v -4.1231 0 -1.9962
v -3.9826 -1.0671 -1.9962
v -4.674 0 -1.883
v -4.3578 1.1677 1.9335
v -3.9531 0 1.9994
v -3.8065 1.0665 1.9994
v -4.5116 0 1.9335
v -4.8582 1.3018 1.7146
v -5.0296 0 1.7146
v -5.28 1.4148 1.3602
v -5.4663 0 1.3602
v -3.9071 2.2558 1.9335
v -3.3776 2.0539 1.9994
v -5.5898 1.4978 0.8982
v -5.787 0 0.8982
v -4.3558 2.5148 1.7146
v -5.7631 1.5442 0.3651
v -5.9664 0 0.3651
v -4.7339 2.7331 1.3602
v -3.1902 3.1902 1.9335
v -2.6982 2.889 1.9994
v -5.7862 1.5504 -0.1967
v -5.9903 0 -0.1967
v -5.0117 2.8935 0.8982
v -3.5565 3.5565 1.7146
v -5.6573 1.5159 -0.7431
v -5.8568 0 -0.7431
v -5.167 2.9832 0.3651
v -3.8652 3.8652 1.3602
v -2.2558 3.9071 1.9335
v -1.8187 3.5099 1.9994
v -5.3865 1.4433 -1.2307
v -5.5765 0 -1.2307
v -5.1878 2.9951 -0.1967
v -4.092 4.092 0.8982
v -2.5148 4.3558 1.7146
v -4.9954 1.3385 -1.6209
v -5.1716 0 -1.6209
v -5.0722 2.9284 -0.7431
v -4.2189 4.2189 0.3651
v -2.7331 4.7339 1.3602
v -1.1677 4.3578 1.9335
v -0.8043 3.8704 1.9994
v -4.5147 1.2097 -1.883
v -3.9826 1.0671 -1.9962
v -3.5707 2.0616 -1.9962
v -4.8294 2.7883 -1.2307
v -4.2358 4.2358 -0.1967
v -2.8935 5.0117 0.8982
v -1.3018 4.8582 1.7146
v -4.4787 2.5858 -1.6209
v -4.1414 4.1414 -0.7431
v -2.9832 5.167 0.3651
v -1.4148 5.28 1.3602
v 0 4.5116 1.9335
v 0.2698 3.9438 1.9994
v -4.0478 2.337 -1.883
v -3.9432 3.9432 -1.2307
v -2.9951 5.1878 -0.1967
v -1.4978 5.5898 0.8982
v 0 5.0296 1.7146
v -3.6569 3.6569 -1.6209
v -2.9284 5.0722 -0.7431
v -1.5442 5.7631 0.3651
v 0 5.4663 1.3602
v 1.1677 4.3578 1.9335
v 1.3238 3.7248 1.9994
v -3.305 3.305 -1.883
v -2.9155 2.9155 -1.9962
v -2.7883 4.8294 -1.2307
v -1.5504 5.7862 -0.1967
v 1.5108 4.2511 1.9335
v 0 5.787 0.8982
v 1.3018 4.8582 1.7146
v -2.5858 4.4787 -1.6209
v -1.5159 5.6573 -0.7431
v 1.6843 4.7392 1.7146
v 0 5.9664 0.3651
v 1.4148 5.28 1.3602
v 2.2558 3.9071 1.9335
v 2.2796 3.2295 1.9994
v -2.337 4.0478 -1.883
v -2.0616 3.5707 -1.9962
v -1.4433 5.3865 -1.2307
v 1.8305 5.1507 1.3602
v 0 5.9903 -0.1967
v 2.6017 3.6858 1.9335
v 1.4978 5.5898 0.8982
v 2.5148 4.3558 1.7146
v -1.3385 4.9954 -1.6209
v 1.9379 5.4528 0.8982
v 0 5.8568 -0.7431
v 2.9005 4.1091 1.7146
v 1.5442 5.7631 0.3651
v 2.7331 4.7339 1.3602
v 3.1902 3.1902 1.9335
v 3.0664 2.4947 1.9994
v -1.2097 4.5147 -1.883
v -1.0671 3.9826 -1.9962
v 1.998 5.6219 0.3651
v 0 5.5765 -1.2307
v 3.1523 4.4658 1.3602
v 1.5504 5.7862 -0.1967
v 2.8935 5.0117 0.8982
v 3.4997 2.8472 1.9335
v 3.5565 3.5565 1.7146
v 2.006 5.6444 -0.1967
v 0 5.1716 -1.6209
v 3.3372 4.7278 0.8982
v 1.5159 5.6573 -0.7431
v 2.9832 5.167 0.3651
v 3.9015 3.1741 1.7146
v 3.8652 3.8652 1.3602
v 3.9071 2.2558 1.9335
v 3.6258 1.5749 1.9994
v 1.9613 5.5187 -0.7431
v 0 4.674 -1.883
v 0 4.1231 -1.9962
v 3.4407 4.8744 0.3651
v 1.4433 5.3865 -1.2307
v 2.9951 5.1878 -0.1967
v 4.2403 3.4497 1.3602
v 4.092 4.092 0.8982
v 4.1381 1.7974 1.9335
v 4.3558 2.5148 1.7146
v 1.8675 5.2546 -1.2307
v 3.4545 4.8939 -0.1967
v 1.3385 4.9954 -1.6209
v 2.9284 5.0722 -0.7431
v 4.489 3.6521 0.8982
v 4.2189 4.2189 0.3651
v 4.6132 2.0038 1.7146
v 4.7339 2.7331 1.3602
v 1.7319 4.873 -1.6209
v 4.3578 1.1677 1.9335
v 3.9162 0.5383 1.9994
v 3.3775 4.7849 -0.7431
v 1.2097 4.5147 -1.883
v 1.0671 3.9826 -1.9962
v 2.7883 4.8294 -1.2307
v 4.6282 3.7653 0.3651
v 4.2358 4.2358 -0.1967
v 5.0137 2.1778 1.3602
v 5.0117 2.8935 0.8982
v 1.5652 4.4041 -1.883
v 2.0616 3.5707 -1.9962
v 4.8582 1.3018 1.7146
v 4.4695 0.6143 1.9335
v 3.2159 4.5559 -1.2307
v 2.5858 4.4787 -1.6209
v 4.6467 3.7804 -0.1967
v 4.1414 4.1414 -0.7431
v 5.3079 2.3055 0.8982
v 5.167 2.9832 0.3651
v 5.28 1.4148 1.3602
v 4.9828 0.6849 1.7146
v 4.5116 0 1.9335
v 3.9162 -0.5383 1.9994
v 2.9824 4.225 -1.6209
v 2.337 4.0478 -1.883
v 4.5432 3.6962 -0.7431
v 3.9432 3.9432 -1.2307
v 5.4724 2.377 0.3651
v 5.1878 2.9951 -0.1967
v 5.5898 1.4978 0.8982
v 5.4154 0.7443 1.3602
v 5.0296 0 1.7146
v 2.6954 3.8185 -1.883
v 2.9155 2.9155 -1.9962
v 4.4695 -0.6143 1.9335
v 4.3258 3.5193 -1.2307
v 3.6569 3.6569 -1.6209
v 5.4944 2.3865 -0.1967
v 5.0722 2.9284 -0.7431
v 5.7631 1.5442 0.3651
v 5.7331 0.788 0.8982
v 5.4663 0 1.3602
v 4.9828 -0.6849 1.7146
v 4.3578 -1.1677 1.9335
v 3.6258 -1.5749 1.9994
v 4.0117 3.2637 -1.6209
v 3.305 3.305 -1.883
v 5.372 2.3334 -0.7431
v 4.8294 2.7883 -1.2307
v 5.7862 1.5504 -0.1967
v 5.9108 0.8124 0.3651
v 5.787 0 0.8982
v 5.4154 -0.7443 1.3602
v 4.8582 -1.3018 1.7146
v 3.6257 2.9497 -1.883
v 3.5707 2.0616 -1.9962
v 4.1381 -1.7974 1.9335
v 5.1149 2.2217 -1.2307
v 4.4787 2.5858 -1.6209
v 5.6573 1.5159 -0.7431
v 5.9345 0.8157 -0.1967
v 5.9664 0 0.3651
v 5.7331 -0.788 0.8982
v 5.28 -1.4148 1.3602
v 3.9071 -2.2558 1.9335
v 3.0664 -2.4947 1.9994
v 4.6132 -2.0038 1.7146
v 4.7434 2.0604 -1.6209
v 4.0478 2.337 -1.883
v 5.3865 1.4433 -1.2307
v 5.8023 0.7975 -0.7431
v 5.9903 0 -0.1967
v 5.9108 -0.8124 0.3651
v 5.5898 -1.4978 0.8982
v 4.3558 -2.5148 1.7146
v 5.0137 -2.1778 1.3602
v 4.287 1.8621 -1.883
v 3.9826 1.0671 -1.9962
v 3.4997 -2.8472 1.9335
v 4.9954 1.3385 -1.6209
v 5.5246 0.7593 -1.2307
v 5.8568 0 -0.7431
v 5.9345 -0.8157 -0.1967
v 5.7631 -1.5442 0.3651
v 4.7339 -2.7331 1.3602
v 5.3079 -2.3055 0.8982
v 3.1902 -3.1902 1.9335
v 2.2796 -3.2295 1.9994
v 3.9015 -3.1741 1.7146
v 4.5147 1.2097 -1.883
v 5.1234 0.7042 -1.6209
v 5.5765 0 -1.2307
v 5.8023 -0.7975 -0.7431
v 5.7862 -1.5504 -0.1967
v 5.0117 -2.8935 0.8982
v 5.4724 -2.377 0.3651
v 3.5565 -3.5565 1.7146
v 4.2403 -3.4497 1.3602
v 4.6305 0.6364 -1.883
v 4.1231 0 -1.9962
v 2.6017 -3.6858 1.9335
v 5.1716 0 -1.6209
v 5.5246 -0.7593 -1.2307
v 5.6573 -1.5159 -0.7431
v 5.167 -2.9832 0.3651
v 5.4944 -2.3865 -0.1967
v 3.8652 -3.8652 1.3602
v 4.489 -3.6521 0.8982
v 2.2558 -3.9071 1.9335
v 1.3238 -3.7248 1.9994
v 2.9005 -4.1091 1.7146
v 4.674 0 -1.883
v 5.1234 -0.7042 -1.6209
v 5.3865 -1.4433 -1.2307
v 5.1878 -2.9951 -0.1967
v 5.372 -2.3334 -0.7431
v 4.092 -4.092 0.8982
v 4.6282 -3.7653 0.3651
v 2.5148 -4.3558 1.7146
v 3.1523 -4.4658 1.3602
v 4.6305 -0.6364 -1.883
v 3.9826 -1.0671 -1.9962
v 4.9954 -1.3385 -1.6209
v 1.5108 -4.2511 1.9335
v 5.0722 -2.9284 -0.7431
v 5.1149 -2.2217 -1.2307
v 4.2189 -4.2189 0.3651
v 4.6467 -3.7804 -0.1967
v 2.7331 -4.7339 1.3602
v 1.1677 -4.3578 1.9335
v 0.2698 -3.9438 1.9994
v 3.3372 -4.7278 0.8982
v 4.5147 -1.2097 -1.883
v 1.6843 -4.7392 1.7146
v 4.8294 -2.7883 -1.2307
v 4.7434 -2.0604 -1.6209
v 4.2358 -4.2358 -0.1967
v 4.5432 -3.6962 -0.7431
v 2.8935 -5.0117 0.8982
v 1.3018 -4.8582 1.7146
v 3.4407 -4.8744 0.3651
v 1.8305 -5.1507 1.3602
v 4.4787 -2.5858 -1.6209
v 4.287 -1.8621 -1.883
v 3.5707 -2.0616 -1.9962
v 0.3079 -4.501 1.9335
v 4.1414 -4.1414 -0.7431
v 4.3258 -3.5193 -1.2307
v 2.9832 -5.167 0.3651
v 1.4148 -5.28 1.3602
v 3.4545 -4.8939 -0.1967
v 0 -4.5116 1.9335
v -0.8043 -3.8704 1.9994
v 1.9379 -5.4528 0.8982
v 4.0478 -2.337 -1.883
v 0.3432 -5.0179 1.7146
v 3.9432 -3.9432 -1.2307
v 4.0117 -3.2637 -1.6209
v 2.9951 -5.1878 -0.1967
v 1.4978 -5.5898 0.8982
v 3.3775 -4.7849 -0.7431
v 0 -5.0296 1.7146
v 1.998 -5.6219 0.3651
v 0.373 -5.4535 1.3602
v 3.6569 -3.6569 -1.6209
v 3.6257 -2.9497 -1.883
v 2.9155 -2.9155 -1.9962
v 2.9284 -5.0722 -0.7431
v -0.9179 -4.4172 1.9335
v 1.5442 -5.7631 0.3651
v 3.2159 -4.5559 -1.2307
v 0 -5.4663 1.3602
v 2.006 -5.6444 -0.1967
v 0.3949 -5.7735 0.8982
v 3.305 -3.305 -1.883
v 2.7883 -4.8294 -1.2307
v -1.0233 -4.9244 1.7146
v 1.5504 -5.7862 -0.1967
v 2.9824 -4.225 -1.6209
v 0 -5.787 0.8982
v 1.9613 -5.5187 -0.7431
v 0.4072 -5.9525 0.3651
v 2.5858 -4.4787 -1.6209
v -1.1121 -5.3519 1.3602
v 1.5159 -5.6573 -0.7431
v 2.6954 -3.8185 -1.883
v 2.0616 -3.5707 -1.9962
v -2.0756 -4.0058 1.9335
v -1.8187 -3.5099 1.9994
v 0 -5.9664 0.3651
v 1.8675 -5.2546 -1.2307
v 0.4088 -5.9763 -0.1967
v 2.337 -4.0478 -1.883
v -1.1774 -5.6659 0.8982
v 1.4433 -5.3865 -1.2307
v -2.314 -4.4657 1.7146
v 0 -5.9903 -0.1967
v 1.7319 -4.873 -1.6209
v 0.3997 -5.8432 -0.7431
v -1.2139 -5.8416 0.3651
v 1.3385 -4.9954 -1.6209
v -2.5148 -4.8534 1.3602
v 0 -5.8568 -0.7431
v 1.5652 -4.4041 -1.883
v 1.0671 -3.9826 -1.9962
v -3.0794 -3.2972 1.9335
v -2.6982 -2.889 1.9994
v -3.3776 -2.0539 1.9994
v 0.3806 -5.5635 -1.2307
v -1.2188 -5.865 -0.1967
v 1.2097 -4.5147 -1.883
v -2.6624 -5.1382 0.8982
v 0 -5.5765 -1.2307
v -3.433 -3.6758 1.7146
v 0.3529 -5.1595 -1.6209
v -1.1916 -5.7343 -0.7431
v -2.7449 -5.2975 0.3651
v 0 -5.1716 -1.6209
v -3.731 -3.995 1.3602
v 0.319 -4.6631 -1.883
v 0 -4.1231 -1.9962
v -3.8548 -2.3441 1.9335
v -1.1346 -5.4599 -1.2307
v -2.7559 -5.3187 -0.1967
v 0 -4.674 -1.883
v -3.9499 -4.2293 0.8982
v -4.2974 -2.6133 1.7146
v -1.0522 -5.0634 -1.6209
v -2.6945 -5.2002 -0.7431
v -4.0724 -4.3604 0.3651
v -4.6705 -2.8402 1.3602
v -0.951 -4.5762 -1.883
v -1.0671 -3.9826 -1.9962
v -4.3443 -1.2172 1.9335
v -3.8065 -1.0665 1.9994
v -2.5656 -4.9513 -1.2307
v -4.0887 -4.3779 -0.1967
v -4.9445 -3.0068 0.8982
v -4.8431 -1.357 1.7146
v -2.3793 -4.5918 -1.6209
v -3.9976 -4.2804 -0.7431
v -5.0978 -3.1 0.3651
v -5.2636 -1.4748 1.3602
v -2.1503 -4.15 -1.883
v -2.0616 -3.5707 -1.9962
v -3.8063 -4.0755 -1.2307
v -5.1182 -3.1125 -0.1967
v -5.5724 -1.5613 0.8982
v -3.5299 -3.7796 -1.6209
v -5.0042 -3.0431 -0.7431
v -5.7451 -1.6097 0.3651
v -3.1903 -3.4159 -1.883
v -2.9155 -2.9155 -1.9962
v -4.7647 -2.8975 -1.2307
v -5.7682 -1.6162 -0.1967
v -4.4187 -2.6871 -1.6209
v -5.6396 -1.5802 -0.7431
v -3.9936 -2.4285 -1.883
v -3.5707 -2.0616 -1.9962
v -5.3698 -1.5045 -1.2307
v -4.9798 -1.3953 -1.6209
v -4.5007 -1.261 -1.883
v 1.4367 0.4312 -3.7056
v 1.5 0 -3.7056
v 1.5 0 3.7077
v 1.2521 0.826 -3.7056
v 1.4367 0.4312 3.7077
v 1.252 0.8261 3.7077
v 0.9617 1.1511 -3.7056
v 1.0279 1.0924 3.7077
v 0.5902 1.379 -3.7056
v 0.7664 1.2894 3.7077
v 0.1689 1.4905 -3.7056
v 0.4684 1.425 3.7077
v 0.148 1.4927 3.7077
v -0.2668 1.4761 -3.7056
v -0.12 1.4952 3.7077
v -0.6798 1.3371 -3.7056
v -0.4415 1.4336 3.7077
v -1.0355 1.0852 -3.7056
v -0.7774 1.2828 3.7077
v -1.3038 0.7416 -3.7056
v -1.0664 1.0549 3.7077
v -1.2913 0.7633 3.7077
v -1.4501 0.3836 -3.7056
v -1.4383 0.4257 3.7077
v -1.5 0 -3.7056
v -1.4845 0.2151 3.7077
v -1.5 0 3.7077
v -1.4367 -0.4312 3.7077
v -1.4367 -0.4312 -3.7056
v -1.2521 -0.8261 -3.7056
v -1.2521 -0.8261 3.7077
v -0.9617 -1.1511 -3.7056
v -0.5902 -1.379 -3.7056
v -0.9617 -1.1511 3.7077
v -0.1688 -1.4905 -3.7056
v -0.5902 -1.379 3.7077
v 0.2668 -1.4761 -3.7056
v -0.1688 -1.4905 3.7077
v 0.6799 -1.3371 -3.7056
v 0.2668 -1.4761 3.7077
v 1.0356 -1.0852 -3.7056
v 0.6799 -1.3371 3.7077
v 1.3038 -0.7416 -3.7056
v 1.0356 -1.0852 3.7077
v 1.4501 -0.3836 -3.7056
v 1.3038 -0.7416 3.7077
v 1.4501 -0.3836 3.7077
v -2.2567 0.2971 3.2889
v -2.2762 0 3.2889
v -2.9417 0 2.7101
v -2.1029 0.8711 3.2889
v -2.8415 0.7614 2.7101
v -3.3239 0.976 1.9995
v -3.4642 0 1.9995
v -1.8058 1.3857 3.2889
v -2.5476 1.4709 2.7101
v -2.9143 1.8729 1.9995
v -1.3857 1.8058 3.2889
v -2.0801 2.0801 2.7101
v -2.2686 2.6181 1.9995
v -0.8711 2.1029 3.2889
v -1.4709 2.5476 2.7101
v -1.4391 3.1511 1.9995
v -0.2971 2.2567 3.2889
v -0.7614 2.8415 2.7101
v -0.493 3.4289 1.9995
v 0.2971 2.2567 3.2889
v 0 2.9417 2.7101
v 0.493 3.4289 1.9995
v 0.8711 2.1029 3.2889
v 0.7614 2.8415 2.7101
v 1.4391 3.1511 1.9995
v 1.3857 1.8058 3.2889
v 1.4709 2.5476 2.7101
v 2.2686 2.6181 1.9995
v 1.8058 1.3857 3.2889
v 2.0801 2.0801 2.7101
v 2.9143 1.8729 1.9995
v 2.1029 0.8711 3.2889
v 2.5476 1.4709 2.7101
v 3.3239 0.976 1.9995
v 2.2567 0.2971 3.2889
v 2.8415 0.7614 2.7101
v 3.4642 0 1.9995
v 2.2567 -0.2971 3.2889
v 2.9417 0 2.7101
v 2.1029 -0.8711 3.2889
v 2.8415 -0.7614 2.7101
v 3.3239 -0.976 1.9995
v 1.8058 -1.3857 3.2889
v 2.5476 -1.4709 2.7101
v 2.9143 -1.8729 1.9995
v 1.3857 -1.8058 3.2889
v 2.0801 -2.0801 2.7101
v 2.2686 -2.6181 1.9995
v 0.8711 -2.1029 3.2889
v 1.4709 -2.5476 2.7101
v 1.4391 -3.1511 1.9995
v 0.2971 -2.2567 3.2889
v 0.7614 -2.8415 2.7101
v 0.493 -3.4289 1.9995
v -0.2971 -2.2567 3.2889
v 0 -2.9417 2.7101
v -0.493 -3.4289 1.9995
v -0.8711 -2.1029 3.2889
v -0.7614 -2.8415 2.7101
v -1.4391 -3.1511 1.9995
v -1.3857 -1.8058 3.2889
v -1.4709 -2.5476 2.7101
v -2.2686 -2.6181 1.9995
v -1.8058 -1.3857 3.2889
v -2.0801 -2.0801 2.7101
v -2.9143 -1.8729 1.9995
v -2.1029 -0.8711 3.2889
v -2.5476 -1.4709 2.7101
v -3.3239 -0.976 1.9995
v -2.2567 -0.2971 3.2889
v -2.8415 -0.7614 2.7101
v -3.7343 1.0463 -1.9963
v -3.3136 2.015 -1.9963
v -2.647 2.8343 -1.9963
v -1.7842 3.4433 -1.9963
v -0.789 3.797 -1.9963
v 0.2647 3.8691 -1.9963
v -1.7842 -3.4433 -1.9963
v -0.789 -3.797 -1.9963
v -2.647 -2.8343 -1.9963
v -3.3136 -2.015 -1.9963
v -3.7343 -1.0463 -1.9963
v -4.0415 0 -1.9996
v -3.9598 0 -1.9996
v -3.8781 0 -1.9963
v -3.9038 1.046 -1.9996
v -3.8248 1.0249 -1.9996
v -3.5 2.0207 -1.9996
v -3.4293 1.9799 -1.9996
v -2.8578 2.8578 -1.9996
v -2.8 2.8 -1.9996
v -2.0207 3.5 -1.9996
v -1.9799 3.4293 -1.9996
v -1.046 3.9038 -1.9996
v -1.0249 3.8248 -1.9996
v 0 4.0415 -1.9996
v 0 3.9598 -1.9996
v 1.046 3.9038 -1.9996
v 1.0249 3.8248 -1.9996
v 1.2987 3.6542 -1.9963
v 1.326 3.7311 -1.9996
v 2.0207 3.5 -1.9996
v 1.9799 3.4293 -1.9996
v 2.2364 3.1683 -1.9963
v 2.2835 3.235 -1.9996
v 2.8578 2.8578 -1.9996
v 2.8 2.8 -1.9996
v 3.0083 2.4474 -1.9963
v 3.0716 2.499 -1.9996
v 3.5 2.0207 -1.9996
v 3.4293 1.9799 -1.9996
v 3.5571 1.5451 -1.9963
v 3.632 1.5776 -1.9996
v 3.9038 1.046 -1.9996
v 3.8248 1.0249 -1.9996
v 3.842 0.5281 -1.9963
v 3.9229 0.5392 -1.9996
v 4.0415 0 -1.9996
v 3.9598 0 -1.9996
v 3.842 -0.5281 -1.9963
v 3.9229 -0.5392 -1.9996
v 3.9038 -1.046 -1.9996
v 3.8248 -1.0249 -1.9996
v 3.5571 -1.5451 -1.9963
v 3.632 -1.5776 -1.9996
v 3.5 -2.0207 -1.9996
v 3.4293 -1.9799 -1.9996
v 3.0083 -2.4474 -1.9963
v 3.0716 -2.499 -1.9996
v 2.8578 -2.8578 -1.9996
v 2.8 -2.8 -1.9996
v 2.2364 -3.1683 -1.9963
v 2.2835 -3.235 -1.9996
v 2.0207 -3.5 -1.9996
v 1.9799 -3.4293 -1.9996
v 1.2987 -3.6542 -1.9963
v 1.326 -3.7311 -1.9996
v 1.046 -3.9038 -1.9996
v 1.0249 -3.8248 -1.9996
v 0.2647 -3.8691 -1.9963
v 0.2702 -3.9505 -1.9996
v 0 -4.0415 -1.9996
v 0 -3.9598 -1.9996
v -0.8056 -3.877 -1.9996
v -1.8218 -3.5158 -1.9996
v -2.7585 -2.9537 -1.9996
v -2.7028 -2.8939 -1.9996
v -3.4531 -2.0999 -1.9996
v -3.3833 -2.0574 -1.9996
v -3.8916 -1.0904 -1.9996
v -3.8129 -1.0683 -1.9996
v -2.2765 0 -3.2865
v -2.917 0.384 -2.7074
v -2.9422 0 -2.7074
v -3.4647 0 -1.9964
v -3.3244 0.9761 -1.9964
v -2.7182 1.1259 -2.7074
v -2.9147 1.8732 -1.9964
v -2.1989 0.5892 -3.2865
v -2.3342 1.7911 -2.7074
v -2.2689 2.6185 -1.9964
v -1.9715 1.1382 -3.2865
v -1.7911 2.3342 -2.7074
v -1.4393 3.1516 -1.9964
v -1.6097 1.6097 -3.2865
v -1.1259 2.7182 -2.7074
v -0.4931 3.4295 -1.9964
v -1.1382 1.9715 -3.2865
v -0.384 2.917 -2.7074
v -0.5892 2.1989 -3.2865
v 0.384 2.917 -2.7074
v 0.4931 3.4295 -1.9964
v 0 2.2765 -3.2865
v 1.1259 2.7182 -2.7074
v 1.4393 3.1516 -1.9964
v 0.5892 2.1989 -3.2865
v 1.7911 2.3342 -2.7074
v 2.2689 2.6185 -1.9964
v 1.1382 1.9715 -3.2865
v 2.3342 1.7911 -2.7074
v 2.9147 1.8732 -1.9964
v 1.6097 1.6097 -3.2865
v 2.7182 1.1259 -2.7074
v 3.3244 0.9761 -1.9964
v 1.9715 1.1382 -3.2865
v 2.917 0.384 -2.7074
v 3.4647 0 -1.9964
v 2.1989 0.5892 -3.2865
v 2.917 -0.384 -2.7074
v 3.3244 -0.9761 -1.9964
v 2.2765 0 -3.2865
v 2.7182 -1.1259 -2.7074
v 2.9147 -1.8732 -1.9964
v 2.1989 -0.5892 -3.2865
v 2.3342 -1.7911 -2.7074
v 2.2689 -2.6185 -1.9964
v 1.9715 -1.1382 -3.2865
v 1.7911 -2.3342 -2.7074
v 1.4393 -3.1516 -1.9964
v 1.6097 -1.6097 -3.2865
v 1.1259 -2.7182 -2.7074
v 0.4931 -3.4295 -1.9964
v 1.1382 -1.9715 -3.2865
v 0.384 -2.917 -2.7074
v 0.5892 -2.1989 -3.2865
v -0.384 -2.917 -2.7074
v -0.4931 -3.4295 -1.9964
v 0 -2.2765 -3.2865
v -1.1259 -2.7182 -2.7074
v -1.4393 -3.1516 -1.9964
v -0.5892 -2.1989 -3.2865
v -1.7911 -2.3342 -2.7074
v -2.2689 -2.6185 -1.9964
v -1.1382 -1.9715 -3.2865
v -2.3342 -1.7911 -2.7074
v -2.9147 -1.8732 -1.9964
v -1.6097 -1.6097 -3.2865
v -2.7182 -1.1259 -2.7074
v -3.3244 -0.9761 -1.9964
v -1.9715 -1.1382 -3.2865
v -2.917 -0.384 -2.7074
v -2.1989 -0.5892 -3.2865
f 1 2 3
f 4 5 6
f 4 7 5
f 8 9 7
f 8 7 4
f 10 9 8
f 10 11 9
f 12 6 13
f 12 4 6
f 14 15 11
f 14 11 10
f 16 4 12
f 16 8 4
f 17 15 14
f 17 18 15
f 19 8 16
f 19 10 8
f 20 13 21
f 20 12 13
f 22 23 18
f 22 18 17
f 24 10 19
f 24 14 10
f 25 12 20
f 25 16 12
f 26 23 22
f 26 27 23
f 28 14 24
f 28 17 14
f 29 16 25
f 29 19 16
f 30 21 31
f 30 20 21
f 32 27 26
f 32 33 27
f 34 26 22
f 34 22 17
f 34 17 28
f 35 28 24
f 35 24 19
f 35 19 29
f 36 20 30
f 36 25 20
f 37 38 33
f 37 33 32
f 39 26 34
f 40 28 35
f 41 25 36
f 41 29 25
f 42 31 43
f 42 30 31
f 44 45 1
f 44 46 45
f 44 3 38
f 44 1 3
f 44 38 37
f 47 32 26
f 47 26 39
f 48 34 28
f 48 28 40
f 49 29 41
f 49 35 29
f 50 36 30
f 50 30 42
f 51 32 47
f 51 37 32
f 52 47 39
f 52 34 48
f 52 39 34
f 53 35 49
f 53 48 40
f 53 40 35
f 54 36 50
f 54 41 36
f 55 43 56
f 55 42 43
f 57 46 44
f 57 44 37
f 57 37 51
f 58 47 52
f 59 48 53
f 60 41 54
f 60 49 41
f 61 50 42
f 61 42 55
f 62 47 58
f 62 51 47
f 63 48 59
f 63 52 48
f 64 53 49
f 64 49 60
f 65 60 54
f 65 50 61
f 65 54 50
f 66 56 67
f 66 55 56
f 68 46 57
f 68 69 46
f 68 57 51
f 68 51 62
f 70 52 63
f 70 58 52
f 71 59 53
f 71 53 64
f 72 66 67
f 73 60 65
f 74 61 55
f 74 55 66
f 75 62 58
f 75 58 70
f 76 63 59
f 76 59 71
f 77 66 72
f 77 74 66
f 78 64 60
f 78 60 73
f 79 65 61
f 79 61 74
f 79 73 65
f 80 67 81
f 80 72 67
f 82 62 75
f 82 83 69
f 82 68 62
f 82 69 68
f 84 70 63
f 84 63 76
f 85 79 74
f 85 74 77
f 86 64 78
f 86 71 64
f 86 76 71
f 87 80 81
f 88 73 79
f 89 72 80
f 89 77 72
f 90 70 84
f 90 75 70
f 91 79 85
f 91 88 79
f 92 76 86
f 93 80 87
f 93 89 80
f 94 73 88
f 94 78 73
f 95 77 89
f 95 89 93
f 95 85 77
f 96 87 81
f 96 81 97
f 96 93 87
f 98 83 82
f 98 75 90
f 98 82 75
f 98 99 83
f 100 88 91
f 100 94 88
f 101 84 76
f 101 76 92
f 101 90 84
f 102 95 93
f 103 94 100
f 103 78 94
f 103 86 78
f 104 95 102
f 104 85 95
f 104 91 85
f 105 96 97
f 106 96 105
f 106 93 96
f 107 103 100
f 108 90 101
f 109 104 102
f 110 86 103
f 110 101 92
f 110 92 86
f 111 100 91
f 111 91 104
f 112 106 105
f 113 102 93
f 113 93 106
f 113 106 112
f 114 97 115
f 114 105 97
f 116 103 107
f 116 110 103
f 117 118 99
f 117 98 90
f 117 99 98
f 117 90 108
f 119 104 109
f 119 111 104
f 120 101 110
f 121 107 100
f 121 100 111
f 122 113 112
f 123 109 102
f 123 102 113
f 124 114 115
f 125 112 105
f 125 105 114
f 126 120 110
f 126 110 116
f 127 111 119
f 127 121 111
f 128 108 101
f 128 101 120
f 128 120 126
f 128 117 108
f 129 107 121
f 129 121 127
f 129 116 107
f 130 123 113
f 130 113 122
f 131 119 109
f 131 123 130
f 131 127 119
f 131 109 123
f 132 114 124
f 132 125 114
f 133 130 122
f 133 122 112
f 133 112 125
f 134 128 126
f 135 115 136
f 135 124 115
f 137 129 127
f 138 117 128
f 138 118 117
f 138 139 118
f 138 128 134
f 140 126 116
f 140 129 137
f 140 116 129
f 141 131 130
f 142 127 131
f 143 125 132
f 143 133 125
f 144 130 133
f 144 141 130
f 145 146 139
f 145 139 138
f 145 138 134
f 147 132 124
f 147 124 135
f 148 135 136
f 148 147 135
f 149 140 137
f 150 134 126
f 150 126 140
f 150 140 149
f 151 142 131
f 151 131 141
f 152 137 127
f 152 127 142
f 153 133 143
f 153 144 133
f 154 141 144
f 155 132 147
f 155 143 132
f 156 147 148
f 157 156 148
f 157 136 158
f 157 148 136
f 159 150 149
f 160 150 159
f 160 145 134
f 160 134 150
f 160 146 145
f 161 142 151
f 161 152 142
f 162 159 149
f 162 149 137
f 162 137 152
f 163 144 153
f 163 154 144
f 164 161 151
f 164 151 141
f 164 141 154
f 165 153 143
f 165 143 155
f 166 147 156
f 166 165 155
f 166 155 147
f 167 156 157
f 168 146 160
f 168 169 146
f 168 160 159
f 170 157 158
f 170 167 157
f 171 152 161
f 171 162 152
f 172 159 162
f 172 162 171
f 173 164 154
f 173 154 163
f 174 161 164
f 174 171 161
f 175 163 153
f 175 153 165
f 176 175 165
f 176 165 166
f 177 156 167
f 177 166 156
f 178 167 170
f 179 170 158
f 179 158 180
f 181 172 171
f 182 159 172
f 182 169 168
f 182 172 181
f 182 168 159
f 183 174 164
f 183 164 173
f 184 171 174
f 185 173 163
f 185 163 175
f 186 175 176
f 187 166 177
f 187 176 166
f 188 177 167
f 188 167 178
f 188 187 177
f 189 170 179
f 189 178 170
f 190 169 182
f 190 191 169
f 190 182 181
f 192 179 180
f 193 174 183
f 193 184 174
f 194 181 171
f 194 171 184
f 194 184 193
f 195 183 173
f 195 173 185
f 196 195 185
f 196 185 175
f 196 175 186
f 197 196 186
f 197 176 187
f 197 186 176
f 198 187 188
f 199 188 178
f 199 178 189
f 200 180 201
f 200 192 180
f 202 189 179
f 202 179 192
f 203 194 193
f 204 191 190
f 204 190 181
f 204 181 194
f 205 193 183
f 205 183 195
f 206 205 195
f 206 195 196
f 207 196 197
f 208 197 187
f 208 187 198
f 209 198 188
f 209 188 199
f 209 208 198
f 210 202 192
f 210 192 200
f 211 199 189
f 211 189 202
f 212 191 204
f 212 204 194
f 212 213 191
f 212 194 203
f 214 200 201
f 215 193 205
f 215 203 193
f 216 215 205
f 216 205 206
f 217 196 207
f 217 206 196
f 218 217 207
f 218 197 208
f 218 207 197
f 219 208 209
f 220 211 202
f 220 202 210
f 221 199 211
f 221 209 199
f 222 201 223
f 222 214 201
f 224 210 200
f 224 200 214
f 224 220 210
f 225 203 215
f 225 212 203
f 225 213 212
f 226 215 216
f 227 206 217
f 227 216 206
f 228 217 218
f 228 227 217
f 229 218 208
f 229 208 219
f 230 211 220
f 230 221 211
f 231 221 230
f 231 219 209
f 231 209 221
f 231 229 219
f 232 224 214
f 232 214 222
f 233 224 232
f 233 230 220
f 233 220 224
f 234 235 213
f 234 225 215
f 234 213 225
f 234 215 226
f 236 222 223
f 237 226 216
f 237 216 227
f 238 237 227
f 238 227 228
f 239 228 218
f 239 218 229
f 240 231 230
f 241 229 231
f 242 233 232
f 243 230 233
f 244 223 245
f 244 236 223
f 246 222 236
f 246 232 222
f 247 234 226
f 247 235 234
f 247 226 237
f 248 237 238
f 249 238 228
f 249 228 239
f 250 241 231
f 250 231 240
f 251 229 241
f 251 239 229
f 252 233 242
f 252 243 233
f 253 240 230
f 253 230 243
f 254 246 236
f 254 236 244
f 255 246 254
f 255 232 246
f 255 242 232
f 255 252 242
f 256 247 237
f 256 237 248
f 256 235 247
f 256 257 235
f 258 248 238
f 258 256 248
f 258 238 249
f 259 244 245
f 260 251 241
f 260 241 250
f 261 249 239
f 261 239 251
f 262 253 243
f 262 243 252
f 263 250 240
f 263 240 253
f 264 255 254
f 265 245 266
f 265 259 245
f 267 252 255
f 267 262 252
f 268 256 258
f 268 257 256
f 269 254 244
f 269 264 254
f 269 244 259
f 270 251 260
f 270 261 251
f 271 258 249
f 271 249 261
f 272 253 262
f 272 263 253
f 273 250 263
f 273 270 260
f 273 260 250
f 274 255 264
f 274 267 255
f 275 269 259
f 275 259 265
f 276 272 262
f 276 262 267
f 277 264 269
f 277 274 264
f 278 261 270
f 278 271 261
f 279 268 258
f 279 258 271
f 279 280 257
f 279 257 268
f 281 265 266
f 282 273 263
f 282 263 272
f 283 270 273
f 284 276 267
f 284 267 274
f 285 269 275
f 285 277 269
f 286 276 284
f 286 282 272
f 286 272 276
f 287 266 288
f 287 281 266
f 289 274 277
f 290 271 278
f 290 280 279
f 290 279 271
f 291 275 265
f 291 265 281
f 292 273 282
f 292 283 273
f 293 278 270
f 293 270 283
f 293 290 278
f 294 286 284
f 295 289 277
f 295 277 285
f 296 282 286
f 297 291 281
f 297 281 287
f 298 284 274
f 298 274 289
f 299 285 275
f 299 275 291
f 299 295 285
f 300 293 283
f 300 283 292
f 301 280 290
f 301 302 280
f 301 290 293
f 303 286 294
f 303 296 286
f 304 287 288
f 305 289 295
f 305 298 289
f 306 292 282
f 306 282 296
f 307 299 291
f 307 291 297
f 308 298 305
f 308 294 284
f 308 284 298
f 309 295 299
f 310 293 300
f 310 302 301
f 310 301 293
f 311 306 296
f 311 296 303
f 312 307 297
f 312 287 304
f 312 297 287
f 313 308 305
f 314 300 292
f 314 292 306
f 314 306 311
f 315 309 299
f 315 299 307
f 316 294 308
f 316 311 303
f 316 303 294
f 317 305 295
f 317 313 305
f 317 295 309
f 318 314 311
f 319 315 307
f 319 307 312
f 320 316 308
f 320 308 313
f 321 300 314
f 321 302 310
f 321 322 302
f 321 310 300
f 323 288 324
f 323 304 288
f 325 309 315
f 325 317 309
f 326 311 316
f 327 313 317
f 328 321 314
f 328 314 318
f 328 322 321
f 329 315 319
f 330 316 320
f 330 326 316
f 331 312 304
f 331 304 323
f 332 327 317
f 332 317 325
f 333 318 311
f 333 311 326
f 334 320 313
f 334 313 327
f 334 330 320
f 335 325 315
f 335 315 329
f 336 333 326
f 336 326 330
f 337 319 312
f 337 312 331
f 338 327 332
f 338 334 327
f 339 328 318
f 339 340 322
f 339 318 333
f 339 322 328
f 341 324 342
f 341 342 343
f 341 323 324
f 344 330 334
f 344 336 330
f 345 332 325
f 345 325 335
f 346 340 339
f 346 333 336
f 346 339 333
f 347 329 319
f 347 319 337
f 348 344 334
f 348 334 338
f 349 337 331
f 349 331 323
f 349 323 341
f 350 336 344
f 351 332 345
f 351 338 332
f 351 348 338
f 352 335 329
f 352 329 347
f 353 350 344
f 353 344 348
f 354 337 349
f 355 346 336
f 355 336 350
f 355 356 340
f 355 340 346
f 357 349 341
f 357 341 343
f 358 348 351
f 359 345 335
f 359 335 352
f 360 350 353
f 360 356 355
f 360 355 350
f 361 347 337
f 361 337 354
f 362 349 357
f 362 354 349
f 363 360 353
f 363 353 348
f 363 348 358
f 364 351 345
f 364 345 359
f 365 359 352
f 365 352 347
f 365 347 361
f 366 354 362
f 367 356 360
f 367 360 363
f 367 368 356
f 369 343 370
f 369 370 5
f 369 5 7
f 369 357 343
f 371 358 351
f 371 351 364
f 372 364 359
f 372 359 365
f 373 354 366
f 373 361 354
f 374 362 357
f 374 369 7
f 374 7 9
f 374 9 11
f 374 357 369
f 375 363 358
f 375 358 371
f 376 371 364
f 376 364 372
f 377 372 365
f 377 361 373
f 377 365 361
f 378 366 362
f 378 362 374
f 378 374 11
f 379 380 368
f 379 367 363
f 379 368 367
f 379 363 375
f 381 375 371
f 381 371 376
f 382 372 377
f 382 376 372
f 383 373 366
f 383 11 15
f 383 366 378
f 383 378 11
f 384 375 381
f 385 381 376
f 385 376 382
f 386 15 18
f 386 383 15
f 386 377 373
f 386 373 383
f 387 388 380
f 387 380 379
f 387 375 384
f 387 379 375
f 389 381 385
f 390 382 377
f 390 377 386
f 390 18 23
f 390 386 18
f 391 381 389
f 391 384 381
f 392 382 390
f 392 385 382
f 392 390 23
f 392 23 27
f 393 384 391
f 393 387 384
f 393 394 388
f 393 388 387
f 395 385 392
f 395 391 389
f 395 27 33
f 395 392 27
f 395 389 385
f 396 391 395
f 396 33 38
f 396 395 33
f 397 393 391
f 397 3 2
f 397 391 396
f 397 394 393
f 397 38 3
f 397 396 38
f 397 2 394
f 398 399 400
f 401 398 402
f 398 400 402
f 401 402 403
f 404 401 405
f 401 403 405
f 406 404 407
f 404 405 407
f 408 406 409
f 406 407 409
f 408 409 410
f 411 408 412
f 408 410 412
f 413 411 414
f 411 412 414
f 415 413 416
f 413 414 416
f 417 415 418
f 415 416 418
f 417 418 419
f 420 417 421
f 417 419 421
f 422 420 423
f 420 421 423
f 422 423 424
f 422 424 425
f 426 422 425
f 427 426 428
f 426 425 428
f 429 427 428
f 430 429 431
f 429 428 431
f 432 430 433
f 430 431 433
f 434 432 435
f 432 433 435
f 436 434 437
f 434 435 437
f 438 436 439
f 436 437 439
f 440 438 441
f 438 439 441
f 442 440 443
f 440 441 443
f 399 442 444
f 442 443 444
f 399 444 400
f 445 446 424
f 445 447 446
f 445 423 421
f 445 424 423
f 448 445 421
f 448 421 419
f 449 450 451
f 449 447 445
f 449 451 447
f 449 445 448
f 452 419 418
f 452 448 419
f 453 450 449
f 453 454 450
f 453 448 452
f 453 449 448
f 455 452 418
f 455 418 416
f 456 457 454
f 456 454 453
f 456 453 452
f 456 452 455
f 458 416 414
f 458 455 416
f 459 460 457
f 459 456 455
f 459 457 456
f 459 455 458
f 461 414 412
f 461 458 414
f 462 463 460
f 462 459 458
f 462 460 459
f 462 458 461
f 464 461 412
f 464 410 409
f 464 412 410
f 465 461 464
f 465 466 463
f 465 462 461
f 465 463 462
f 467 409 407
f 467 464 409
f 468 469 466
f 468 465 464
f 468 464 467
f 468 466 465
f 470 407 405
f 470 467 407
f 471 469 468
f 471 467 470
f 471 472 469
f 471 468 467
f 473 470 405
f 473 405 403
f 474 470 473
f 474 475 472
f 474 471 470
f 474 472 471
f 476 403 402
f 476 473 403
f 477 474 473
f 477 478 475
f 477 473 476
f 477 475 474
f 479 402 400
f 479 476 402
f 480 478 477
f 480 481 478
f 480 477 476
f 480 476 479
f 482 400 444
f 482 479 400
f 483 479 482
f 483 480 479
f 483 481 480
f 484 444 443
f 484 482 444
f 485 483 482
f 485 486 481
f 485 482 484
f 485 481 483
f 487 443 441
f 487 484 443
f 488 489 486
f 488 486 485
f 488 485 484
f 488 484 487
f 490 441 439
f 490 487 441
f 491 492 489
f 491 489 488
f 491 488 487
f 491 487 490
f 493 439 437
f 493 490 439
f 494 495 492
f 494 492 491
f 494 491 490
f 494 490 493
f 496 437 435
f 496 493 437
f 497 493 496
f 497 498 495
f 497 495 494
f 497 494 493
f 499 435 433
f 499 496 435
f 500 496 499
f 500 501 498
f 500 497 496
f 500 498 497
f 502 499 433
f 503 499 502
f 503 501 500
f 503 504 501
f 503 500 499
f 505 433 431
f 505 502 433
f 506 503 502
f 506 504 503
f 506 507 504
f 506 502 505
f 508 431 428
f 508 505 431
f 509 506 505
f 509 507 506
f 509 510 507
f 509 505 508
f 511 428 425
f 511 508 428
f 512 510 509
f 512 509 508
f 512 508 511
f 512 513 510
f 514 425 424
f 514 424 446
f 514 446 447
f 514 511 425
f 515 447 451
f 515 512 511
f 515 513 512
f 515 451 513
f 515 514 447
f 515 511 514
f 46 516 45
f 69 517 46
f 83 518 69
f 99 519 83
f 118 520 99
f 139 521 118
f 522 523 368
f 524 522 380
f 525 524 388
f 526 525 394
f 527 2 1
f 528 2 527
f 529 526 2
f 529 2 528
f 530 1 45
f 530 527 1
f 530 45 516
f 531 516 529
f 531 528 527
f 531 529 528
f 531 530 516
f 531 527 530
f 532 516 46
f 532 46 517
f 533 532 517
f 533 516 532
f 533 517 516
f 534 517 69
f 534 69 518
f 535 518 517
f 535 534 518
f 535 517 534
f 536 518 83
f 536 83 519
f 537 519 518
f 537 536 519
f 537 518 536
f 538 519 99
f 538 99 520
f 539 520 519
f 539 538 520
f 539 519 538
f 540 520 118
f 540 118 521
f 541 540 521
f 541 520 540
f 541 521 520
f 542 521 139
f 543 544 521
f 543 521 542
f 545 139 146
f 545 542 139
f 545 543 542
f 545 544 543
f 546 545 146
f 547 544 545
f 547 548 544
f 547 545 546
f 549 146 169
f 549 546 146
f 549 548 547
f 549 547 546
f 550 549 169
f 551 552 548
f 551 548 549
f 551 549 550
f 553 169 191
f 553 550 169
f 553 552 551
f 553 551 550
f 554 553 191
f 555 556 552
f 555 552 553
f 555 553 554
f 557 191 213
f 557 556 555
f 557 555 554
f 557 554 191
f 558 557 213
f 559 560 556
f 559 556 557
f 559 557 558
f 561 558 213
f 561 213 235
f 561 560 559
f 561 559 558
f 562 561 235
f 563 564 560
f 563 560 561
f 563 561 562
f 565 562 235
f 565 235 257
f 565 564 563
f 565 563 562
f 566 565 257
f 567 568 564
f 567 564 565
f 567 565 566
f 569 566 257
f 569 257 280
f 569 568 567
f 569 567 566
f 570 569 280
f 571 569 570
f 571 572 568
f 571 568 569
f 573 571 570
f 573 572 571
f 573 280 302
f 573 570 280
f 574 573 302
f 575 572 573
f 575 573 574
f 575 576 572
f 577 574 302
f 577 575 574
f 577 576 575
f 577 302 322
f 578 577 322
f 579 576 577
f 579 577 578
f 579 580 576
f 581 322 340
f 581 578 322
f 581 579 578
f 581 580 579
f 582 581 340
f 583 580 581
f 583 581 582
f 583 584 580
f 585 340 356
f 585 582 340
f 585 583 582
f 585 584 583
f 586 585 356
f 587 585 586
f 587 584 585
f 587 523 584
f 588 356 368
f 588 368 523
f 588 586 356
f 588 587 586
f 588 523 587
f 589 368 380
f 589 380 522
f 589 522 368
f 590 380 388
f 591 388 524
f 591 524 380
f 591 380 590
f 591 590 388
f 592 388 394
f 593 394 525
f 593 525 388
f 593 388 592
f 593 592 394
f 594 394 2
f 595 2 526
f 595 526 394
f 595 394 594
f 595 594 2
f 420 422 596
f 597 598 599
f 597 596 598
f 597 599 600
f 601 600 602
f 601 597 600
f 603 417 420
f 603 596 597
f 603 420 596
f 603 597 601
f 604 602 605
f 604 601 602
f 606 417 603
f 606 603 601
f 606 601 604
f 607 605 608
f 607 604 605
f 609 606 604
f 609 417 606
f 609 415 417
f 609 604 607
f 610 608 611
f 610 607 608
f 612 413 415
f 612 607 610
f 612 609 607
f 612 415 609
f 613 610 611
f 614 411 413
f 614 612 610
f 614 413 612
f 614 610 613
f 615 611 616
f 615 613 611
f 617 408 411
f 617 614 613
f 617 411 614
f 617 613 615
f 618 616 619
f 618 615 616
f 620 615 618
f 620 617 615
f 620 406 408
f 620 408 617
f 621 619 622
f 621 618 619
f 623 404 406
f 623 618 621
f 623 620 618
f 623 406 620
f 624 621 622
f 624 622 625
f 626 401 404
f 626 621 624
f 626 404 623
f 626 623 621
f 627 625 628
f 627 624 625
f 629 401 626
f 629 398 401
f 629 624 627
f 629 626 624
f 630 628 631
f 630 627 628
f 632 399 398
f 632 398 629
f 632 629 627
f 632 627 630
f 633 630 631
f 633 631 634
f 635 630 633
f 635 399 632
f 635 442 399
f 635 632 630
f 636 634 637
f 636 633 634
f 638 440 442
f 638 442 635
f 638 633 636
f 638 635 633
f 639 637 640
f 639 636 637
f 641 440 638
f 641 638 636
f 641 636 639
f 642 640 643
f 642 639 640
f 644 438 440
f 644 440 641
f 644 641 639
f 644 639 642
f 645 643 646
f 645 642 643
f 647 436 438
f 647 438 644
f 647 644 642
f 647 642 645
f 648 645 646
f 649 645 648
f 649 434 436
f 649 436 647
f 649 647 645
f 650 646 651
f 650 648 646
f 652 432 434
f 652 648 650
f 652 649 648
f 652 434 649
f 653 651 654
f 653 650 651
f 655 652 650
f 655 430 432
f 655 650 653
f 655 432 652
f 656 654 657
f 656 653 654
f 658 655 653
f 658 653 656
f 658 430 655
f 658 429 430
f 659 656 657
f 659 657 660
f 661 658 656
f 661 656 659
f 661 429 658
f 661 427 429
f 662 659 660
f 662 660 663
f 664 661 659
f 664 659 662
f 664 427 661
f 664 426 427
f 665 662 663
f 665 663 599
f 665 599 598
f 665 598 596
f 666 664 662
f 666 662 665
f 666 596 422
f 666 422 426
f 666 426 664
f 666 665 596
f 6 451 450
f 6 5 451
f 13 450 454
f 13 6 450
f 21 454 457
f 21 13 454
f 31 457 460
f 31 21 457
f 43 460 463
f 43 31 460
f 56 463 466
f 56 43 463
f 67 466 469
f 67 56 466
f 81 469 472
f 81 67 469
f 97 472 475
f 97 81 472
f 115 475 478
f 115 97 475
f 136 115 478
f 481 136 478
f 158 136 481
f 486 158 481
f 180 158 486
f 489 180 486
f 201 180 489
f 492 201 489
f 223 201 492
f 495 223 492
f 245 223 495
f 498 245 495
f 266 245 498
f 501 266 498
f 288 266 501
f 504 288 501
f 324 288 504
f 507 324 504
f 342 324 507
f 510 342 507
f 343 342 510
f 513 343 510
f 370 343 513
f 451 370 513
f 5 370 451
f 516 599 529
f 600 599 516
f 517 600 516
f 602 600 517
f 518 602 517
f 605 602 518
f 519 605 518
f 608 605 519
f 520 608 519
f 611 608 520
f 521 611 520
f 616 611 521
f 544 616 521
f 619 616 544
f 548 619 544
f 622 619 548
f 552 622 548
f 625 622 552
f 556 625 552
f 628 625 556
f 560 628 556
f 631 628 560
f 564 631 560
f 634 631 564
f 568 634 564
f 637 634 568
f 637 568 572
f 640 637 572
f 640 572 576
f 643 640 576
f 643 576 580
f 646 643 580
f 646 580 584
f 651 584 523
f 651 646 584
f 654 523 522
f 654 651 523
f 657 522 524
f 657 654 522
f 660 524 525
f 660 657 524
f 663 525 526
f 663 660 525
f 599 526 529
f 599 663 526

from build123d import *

# Parameters (mm, degrees)
F2_R          = 1.5
F3_DEPTH      = 3.998497265
F3_DEPTH_BACK = 4.0006311494


with BuildPart() as f1:
    # F0 (on Front) → F1 (revolve)
    with BuildSketch(Plane.XZ):
        with BuildLine():
            Line((-3.878140574, -1.9962841181), (-3.4647271293, -1.9964134512))
            ThreePointArc((-3.4647271293, -1.9964134512), (-2.0005418335, -3.4612859959), (0, -3.997497265))
            Line((0, -3.997497265), (0, 3.9996311494))
            ThreePointArc((0, 3.9996311494), (-2.000079858, 3.4636866573), (-3.4641938241, 1.9994714302))
            Line((-3.4641938241, 1.9994714302), (-3.9530518044, 1.9994488908))
            ThreePointArc((-3.9530518044, 1.9994488908), (-5.9981910715, 0.0850437646), (-4.1231084445, -1.9962074819))
            Line((-4.1231084445, -1.9962074819), (-3.878140574, -1.9962841181))
        make_face()
        with BuildLine():
            ThreePointArc((-4.1231084445, -1.9962074819), (-4.0006256837, -1.9999999021), (-3.878140574, -1.9962841181))
            Line((-3.878140574, -1.9962841181), (-4.1231084445, -1.9962074819))
        make_face()
    revolve(axis=Axis((0, 0, 0.0010669422), (0, 0, -1)))

    # F2 (on Top) → F3 (cut, two sides)
    with BuildSketch(Plane.XY) as f3_sk:
        Circle(F2_R)
    extrude(amount=-F3_DEPTH, mode=Mode.SUBTRACT)
    extrude(f3_sk.sketch, amount=F3_DEPTH_BACK, mode=Mode.SUBTRACT)


solid = f1.part
